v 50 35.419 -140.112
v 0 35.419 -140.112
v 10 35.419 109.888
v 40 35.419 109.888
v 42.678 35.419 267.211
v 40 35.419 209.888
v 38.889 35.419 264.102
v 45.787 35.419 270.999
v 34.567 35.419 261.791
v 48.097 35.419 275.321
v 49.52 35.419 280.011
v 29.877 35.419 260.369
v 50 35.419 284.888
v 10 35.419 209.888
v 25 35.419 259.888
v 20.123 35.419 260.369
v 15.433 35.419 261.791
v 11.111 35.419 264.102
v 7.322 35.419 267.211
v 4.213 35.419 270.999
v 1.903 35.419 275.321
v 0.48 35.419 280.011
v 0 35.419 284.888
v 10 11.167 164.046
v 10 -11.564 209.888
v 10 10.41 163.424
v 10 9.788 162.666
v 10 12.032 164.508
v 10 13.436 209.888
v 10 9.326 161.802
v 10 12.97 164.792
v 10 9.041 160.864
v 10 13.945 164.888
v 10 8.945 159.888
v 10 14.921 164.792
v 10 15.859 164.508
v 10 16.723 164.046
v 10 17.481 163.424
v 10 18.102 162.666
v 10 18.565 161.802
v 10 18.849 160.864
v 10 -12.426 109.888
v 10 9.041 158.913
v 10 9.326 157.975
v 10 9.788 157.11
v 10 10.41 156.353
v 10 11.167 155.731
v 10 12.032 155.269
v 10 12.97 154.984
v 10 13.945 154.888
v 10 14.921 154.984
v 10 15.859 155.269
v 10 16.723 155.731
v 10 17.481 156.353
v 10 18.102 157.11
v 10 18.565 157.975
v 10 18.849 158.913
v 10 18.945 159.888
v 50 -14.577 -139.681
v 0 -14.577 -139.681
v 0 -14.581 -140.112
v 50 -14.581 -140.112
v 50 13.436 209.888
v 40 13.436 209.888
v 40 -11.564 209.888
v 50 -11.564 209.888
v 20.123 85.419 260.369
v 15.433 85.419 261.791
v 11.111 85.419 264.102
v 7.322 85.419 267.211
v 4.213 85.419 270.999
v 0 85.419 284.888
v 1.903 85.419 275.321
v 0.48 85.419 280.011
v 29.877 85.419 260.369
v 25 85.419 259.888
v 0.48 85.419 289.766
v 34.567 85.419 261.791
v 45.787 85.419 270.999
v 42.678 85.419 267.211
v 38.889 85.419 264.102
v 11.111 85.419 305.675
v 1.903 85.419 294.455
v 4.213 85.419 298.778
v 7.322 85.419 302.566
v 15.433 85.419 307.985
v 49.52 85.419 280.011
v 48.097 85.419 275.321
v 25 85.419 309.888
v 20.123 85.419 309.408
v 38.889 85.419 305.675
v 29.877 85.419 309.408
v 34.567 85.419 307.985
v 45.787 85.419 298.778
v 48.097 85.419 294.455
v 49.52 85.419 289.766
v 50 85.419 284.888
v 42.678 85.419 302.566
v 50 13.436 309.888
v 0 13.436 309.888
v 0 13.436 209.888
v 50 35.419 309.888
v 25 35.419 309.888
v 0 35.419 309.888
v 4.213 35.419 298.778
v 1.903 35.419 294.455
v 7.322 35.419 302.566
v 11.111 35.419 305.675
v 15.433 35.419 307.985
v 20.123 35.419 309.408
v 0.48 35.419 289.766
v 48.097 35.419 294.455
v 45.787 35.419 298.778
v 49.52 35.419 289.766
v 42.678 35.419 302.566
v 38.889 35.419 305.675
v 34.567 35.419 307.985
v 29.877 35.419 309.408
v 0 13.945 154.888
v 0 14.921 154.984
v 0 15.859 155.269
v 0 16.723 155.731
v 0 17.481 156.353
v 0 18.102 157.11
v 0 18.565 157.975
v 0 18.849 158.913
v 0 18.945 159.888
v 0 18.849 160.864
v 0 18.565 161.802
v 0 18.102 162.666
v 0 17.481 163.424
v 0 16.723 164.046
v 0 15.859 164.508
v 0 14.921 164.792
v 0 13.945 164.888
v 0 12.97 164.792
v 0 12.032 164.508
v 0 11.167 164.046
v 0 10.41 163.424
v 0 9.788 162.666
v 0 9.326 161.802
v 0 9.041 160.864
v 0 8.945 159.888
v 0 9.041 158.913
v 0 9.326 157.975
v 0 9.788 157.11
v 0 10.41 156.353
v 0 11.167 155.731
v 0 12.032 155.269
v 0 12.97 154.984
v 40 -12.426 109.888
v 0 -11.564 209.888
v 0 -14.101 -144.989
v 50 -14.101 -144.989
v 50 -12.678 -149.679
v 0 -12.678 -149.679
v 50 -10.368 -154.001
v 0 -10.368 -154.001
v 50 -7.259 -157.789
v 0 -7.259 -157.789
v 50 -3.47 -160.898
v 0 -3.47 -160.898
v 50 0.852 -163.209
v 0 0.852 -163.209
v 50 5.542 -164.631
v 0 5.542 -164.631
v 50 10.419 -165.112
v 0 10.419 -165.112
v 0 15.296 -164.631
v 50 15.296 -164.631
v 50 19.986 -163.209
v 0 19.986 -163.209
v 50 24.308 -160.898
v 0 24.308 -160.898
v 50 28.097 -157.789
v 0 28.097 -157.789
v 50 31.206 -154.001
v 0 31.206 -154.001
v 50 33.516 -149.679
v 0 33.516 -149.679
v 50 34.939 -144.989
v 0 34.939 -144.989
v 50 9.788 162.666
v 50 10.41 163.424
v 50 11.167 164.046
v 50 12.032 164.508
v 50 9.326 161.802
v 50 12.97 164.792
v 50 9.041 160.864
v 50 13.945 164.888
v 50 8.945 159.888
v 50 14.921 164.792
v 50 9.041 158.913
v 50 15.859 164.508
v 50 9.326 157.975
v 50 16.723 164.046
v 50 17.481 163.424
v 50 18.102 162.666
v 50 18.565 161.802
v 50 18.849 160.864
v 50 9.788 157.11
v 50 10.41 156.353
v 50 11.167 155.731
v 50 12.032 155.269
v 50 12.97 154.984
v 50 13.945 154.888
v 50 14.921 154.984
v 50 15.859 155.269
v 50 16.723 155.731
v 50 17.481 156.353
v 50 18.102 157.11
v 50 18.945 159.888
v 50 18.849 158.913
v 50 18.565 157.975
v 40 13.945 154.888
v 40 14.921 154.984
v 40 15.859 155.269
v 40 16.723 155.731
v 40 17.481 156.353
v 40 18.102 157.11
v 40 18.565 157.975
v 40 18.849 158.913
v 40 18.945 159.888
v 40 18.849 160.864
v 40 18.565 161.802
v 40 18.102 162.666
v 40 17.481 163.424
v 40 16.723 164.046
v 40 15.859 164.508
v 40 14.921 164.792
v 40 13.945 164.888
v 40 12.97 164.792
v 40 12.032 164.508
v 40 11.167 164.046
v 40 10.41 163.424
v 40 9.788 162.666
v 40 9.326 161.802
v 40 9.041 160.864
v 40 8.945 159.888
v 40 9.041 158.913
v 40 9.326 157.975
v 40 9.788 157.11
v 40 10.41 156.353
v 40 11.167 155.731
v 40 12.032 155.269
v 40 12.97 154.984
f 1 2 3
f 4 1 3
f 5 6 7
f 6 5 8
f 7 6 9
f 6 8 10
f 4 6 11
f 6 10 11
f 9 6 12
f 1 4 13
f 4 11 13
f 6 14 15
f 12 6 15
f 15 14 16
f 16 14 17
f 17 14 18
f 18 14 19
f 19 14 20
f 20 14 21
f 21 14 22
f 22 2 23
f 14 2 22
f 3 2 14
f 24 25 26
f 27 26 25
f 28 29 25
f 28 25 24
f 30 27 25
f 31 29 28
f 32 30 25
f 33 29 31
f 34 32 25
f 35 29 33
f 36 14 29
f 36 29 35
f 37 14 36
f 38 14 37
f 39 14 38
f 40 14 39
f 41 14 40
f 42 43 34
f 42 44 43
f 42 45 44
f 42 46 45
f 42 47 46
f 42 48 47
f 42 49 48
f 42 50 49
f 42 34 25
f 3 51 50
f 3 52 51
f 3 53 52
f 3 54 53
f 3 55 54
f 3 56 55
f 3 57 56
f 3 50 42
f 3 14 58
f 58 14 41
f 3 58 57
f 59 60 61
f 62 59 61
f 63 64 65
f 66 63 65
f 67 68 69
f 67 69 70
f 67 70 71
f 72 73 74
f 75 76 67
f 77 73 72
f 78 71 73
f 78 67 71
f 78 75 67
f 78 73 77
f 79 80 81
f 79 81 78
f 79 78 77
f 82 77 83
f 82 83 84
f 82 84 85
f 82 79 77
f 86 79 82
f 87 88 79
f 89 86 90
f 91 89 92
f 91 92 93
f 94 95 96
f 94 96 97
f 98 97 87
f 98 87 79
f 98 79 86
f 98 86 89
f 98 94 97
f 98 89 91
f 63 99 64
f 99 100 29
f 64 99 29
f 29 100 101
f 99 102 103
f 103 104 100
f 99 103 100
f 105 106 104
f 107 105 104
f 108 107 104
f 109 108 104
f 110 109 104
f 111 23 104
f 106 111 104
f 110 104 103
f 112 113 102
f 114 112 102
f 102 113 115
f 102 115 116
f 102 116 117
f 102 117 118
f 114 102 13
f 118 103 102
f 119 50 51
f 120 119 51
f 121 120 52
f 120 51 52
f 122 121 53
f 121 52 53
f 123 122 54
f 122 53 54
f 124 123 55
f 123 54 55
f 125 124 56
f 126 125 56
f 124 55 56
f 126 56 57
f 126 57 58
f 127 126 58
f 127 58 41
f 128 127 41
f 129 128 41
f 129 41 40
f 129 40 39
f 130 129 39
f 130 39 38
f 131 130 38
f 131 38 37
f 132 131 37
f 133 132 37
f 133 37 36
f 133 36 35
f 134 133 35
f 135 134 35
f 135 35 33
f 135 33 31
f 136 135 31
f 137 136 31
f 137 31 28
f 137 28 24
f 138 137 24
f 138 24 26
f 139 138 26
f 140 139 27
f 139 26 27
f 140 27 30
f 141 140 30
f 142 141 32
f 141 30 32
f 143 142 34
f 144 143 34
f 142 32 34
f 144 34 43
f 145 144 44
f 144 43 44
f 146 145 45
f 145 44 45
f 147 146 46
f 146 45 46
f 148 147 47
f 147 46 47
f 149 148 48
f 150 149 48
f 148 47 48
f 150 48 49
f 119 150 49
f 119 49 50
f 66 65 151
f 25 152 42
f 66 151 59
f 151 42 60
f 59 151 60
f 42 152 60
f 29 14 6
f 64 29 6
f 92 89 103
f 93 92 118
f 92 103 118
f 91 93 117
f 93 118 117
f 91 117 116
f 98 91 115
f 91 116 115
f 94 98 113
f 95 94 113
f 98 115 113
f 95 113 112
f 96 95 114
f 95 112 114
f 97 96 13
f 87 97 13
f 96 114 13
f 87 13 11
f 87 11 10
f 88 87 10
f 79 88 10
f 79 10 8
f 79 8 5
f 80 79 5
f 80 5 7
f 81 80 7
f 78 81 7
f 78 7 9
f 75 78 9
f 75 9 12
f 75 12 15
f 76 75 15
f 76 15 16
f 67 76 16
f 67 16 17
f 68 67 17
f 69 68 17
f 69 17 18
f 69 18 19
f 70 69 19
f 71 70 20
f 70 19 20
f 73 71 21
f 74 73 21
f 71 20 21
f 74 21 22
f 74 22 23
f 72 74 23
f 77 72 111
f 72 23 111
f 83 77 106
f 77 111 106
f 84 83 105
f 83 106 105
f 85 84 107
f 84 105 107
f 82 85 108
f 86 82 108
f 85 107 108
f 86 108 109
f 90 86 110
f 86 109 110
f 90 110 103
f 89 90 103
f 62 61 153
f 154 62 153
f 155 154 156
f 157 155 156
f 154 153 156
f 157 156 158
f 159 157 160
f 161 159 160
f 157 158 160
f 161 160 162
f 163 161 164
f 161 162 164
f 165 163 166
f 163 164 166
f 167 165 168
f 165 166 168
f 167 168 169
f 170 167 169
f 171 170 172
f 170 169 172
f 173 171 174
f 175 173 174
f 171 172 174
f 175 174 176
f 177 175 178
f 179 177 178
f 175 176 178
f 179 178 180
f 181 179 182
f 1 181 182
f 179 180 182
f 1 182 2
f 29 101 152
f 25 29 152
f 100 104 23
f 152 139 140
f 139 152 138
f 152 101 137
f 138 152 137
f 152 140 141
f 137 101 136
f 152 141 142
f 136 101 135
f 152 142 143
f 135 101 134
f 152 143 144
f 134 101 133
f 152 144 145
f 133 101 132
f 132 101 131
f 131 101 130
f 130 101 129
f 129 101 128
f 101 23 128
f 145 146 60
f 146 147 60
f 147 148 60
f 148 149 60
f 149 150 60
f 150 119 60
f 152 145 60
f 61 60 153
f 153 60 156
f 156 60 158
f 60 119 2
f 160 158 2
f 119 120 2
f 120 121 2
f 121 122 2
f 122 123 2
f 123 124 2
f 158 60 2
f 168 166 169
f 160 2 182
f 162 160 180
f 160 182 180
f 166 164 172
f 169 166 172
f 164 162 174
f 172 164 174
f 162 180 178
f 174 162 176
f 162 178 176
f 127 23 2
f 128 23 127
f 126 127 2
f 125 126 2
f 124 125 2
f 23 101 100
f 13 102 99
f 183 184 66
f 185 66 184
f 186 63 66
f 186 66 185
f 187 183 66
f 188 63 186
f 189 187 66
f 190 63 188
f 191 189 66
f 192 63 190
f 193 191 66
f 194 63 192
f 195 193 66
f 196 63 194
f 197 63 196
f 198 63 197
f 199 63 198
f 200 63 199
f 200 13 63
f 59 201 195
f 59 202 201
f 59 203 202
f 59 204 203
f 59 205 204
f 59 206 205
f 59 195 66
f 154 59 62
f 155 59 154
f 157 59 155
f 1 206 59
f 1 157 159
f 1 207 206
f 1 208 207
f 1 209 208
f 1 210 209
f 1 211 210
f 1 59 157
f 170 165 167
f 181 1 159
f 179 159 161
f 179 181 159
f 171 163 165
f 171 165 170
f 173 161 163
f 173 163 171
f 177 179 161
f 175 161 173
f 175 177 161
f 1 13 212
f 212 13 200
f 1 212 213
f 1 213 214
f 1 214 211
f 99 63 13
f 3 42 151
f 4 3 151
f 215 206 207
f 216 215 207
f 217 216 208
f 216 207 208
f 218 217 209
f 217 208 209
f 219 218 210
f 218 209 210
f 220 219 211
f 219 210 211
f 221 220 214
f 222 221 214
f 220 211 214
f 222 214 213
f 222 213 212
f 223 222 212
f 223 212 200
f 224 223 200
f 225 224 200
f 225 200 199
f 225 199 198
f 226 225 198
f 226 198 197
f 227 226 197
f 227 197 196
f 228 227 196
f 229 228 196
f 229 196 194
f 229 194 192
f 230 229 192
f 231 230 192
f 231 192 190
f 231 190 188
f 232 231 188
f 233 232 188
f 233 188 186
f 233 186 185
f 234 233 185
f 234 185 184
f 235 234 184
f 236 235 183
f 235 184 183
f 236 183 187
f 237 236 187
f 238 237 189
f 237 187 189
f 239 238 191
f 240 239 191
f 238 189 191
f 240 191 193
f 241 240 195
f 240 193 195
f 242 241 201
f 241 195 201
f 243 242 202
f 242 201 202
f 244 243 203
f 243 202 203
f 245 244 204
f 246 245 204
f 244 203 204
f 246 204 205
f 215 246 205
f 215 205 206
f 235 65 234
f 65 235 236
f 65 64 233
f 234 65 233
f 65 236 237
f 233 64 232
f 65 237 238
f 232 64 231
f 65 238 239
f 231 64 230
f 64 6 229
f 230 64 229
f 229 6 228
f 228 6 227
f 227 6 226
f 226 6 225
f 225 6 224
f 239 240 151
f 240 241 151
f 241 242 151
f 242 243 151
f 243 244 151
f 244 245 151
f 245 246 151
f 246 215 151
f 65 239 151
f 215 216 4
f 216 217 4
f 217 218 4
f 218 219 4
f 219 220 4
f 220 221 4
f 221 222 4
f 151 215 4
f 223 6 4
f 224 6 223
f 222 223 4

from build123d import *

# Parameters (mm, degrees)
BOSS_EXTRUDE1_DEPTH = 50
BOSS_EXTRUDE2_START = 35.418994
SKETCH2_R           = 25
BOSS_EXTRUDE2_DEPTH = 50
SKETCH4_W           = 30
SKETCH4_H           = 100
CUT_EXTRUDE1_DEPTH  = 318.853328976
SKETCH5_R           = 5
CUT_EXTRUDE2_DEPTH  = 326.310841007


with BuildPart() as part:
    # Sketch1 → Boss-Extrude1 (new body)
    with BuildSketch(Plane(origin=(0, 0, 0), x_dir=(0, 0, -1), z_dir=(1, 0, 0))):
        with BuildLine():
            Line((140.111731844, 35.418994413), (-209.888268156, 35.418994413))
            Line((-209.888268156, 35.418994413), (-309.888268156, 35.418994413))
            Line((-309.888268156, 35.418994413), (-309.888268156, 13.43575419))
            Line((-309.888268156, 13.43575419), (-209.888268156, 13.43575419))
            Line((-209.888268156, 13.43575419), (-209.888268156, -11.56424581))
            Line((-209.888268156, -11.56424581), (139.680798176, -14.577291234))
            ThreePointArc((139.680798176, -14.577291234), (115.112660449, 10.634469251), (140.111731844, 35.418994413))
        make_face()
        with BuildLine():
            Line((140.111731844, -14.581005587), (140.111731844, 35.418994413))
            ThreePointArc((140.111731844, 35.418994413), (115.112660449, 10.634469251), (139.680798176, -14.577291234))
            Line((139.680798176, -14.577291234), (140.111731844, -14.581005587))
        make_face()
        with BuildLine():
            ThreePointArc((165.111731844, 10.418994413), (157.789401373, 28.096663943), (140.111731844, 35.418994413))
            Line((140.111731844, 35.418994413), (140.111731844, -14.581005587))
            ThreePointArc((140.111731844, -14.581005587), (157.789401373, -7.258675116), (165.111731844, 10.418994413))
        make_face()
    extrude(amount=BOSS_EXTRUDE1_DEPTH)

    # Sketch2 → Boss-Extrude2 (add)
    with BuildSketch(Plane(origin=(0, 0, 0), x_dir=(1, 0, 0), z_dir=(0, 1, 0)).offset(BOSS_EXTRUDE2_START)):
        with Locations(Location((25, -284.888268156, 0), (0, 0, 270))):
            Circle(SKETCH2_R)
    extrude(amount=BOSS_EXTRUDE2_DEPTH)

    # Sketch4 → Cut-Extrude1 (cut, through all)
    with BuildSketch(Plane(origin=(0, 35.418994413, 0), x_dir=(1, 0, 0), z_dir=(0, 1, 0))):
        with Locations((25, -159.888268156)):
            Rectangle(SKETCH4_W, SKETCH4_H)
    extrude(amount=-CUT_EXTRUDE1_DEPTH, mode=Mode.SUBTRACT)

    # Sketch5 → Cut-Extrude2 (cut, through all)
    with BuildSketch(Plane(origin=(50, 0, 0), x_dir=(0, 0, -1), z_dir=(1, 0, 0))):
        with Locations((-159.888268156, 13.945126907)):
            Circle(SKETCH5_R)
    extrude(amount=-CUT_EXTRUDE2_DEPTH, mode=Mode.SUBTRACT)


solid = part.part
